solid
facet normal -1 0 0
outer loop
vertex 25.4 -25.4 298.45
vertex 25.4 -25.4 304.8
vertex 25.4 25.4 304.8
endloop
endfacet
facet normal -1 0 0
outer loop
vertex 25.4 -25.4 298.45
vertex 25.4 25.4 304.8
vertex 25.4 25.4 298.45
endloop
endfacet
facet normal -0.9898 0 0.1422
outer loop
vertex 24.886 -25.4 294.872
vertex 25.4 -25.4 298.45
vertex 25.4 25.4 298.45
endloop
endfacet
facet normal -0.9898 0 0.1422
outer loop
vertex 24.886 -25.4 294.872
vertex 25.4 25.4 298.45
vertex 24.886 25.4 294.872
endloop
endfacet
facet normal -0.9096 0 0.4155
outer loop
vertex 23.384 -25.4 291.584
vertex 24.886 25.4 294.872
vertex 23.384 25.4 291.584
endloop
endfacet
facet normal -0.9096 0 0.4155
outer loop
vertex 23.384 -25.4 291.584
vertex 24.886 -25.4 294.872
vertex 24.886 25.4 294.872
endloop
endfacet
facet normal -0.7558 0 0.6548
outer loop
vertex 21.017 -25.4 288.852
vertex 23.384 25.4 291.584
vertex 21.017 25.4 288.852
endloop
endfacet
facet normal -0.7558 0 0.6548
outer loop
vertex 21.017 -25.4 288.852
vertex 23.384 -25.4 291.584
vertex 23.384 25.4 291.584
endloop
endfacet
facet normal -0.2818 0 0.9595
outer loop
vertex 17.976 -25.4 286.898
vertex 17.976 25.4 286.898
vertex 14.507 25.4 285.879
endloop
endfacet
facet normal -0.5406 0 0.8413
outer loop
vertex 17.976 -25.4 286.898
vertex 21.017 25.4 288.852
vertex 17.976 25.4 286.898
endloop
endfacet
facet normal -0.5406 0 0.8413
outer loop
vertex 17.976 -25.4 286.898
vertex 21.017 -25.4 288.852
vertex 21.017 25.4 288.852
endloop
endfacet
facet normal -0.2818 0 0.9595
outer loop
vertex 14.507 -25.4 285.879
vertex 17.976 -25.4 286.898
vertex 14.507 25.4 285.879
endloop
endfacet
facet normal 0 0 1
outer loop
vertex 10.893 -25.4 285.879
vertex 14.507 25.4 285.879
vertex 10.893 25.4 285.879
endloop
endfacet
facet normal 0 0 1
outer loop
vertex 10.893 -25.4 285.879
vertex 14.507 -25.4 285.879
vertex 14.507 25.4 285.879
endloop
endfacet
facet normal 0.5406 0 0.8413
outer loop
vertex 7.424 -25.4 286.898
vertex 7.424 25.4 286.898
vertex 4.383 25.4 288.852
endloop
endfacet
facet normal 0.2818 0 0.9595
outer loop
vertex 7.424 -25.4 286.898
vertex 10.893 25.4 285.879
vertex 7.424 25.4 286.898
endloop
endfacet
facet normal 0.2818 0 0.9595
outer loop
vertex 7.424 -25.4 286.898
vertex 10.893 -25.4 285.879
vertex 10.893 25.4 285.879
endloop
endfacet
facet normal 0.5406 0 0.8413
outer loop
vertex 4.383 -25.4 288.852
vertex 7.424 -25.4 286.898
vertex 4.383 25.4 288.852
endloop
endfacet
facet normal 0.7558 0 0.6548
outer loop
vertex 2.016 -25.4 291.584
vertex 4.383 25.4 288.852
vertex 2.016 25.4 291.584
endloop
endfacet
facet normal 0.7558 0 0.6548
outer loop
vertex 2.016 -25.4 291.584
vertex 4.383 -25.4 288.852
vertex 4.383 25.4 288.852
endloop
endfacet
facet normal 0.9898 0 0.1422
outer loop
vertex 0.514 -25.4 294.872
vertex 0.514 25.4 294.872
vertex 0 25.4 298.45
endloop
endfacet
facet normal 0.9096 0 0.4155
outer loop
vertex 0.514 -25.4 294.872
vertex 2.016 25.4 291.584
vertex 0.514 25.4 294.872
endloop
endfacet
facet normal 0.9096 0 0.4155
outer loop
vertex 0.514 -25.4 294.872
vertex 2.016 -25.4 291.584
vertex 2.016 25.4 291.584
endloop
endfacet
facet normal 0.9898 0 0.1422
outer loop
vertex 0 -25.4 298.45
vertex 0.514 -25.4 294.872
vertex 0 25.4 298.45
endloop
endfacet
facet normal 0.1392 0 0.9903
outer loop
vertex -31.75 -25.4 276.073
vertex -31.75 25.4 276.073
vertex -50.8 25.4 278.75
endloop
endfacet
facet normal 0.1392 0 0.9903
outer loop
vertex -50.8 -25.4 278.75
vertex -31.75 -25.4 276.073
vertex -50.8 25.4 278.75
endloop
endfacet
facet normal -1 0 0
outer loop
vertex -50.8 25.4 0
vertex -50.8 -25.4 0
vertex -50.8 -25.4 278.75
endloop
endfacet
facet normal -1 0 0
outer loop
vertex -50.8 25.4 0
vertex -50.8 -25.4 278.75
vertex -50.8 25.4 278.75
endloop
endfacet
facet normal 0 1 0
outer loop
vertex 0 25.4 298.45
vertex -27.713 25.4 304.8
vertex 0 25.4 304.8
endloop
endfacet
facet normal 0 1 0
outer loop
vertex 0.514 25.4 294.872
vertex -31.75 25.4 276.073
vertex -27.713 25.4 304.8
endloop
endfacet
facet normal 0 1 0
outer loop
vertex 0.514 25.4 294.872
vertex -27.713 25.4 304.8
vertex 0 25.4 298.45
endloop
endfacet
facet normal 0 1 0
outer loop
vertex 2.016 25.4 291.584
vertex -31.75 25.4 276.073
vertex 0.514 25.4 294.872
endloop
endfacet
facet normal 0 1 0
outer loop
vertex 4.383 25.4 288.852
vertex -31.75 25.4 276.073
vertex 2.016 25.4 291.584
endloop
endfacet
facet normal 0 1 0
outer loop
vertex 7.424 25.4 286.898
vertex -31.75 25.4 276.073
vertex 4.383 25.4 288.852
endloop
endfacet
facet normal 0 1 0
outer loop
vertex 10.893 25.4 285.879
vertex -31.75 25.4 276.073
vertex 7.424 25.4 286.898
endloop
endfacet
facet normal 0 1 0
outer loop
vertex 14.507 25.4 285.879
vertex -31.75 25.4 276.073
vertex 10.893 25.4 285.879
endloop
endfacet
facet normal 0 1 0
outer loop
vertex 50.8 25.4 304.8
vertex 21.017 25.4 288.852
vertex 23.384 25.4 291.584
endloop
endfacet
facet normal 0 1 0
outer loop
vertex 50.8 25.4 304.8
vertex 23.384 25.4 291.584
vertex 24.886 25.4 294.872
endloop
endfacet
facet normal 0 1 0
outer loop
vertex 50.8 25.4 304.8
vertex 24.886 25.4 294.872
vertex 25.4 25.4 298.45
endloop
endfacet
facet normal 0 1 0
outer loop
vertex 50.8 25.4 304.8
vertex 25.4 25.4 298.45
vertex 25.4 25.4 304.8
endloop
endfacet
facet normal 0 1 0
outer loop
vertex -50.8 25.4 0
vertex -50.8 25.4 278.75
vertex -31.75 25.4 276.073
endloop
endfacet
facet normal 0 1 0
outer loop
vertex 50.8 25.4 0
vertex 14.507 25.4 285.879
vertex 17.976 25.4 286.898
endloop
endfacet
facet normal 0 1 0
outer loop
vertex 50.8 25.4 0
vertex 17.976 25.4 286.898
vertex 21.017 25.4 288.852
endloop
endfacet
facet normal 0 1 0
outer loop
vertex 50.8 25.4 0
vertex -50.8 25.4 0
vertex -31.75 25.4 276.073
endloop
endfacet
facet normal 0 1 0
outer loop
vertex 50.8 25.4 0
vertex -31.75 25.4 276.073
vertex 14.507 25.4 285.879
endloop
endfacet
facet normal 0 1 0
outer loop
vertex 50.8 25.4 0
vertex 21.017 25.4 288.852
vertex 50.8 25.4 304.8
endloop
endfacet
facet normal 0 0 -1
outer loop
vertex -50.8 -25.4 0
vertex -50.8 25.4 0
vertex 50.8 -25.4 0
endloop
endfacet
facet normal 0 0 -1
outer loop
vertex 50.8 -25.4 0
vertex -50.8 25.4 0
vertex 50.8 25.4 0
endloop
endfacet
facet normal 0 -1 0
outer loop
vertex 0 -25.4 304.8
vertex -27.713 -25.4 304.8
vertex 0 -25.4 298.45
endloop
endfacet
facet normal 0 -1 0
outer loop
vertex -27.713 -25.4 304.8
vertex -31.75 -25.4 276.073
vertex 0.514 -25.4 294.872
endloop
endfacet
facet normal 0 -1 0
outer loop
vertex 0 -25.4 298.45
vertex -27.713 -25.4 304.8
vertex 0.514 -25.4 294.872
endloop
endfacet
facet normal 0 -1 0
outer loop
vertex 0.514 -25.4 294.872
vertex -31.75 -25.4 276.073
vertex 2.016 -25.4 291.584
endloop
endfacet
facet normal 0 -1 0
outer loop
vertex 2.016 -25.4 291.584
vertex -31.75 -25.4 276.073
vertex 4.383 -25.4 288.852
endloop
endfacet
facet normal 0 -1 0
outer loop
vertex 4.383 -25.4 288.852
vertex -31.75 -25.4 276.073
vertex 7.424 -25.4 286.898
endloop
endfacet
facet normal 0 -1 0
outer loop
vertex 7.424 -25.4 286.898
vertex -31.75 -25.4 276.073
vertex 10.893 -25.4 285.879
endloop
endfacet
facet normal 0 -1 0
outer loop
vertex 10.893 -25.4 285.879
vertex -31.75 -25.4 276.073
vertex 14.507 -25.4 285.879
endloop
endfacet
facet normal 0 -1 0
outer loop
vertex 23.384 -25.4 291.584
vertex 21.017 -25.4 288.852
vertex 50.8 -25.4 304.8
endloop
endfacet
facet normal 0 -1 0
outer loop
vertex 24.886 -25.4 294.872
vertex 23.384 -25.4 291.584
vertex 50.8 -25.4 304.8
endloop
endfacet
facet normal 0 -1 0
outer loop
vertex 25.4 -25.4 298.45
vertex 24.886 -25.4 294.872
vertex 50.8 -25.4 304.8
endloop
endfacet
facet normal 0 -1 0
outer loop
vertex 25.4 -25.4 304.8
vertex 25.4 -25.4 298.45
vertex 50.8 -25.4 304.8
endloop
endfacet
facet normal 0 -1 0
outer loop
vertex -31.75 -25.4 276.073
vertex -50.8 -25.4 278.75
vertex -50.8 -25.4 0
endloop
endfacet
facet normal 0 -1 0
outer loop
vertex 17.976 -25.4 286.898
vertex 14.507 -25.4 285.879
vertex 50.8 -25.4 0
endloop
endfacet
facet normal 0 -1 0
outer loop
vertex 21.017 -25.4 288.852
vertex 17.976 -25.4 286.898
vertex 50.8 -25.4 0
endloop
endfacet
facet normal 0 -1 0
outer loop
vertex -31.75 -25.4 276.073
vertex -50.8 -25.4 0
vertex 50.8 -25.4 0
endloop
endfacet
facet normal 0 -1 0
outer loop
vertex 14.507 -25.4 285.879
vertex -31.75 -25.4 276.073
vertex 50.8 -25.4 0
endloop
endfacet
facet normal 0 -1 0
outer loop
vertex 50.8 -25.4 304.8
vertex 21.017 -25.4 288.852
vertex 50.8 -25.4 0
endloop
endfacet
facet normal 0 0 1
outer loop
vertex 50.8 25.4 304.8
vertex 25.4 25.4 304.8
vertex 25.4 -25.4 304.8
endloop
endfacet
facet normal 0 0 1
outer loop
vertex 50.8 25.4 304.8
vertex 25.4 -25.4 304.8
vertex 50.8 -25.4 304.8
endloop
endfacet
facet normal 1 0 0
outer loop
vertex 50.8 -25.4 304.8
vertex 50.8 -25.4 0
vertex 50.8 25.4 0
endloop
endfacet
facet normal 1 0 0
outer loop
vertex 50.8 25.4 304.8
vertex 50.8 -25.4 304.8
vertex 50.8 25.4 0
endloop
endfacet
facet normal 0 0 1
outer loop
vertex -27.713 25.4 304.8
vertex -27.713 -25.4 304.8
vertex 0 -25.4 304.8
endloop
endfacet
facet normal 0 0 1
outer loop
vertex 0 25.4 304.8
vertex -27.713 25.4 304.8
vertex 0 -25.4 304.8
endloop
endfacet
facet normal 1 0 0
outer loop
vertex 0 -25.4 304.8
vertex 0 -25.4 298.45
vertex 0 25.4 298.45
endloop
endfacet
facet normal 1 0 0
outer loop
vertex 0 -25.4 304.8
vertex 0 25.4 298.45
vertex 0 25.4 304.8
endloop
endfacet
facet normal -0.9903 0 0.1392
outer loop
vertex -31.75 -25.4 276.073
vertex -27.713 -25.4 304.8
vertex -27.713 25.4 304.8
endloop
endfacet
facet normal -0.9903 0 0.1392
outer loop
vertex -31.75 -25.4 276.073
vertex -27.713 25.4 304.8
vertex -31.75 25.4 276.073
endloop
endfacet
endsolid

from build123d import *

# Parameters (mm, degrees)
SKETCH1_W               = 101.6
SKETCH1_H               = 50.8
BOSS_EXTRUDE1_DEPTH     = 304.8
CUT_EXTRUDE1_DEPTH      = 314.152231351
CUT_EXTRUDE1_DEPTH_BACK = 314.152231351


with BuildPart() as part:
    # Sketch1 → Boss-Extrude1 (new body)
    with BuildSketch(Plane.XY):
        Rectangle(SKETCH1_W, SKETCH1_H)
    extrude(amount=BOSS_EXTRUDE1_DEPTH)

    # Sketch2 → Cut-Extrude1 (cut, two sides: drawn at the far end of the back side and taken through both)
    with BuildSketch(Plane(origin=(0, 25.4, 0), x_dir=(1, 0, 0), z_dir=(0, 1, 0)).offset(-CUT_EXTRUDE1_DEPTH_BACK)):
        with BuildLine():
            ThreePointArc((25.4, -298.45), (12.7, -285.75), (0, -298.45))
            ThreePointArc((0, -298.45), (0.432742006, -301.737001873), (1.701477372, -304.8))
            Line((1.701477372, -304.8), (23.698522628, -304.8))
            ThreePointArc((23.698522628, -304.8), (24.967257994, -301.737001873), (25.4, -298.45))
        make_face()
        with BuildLine():
            Line((23.698522628, -304.8), (1.701477372, -304.8))
            ThreePointArc((1.701477372, -304.8), (12.7, -311.15), (23.698522628, -304.8))
        make_face()
        with BuildLine():
            Line((25.4, -304.8), (25.4, -298.45))
            ThreePointArc((25.4, -298.45), (24.967257994, -301.737001873), (23.698522628, -304.8))
            Line((23.698522628, -304.8), (25.4, -304.8))
        make_face()
        with BuildLine():
            Line((0, -298.45), (0, -304.8))
            Line((0, -304.8), (1.701477372, -304.8))
            ThreePointArc((1.701477372, -304.8), (0.432742006, -301.737001873), (0, -298.45))
        make_face()
        Polygon((-31.75, -276.0726), (-50.8, -278.749902901), (-50.8, -304.8), (-27.712627225, -304.8), align=None)
    extrude(amount=CUT_EXTRUDE1_DEPTH + CUT_EXTRUDE1_DEPTH_BACK, mode=Mode.SUBTRACT)


solid = part.part
